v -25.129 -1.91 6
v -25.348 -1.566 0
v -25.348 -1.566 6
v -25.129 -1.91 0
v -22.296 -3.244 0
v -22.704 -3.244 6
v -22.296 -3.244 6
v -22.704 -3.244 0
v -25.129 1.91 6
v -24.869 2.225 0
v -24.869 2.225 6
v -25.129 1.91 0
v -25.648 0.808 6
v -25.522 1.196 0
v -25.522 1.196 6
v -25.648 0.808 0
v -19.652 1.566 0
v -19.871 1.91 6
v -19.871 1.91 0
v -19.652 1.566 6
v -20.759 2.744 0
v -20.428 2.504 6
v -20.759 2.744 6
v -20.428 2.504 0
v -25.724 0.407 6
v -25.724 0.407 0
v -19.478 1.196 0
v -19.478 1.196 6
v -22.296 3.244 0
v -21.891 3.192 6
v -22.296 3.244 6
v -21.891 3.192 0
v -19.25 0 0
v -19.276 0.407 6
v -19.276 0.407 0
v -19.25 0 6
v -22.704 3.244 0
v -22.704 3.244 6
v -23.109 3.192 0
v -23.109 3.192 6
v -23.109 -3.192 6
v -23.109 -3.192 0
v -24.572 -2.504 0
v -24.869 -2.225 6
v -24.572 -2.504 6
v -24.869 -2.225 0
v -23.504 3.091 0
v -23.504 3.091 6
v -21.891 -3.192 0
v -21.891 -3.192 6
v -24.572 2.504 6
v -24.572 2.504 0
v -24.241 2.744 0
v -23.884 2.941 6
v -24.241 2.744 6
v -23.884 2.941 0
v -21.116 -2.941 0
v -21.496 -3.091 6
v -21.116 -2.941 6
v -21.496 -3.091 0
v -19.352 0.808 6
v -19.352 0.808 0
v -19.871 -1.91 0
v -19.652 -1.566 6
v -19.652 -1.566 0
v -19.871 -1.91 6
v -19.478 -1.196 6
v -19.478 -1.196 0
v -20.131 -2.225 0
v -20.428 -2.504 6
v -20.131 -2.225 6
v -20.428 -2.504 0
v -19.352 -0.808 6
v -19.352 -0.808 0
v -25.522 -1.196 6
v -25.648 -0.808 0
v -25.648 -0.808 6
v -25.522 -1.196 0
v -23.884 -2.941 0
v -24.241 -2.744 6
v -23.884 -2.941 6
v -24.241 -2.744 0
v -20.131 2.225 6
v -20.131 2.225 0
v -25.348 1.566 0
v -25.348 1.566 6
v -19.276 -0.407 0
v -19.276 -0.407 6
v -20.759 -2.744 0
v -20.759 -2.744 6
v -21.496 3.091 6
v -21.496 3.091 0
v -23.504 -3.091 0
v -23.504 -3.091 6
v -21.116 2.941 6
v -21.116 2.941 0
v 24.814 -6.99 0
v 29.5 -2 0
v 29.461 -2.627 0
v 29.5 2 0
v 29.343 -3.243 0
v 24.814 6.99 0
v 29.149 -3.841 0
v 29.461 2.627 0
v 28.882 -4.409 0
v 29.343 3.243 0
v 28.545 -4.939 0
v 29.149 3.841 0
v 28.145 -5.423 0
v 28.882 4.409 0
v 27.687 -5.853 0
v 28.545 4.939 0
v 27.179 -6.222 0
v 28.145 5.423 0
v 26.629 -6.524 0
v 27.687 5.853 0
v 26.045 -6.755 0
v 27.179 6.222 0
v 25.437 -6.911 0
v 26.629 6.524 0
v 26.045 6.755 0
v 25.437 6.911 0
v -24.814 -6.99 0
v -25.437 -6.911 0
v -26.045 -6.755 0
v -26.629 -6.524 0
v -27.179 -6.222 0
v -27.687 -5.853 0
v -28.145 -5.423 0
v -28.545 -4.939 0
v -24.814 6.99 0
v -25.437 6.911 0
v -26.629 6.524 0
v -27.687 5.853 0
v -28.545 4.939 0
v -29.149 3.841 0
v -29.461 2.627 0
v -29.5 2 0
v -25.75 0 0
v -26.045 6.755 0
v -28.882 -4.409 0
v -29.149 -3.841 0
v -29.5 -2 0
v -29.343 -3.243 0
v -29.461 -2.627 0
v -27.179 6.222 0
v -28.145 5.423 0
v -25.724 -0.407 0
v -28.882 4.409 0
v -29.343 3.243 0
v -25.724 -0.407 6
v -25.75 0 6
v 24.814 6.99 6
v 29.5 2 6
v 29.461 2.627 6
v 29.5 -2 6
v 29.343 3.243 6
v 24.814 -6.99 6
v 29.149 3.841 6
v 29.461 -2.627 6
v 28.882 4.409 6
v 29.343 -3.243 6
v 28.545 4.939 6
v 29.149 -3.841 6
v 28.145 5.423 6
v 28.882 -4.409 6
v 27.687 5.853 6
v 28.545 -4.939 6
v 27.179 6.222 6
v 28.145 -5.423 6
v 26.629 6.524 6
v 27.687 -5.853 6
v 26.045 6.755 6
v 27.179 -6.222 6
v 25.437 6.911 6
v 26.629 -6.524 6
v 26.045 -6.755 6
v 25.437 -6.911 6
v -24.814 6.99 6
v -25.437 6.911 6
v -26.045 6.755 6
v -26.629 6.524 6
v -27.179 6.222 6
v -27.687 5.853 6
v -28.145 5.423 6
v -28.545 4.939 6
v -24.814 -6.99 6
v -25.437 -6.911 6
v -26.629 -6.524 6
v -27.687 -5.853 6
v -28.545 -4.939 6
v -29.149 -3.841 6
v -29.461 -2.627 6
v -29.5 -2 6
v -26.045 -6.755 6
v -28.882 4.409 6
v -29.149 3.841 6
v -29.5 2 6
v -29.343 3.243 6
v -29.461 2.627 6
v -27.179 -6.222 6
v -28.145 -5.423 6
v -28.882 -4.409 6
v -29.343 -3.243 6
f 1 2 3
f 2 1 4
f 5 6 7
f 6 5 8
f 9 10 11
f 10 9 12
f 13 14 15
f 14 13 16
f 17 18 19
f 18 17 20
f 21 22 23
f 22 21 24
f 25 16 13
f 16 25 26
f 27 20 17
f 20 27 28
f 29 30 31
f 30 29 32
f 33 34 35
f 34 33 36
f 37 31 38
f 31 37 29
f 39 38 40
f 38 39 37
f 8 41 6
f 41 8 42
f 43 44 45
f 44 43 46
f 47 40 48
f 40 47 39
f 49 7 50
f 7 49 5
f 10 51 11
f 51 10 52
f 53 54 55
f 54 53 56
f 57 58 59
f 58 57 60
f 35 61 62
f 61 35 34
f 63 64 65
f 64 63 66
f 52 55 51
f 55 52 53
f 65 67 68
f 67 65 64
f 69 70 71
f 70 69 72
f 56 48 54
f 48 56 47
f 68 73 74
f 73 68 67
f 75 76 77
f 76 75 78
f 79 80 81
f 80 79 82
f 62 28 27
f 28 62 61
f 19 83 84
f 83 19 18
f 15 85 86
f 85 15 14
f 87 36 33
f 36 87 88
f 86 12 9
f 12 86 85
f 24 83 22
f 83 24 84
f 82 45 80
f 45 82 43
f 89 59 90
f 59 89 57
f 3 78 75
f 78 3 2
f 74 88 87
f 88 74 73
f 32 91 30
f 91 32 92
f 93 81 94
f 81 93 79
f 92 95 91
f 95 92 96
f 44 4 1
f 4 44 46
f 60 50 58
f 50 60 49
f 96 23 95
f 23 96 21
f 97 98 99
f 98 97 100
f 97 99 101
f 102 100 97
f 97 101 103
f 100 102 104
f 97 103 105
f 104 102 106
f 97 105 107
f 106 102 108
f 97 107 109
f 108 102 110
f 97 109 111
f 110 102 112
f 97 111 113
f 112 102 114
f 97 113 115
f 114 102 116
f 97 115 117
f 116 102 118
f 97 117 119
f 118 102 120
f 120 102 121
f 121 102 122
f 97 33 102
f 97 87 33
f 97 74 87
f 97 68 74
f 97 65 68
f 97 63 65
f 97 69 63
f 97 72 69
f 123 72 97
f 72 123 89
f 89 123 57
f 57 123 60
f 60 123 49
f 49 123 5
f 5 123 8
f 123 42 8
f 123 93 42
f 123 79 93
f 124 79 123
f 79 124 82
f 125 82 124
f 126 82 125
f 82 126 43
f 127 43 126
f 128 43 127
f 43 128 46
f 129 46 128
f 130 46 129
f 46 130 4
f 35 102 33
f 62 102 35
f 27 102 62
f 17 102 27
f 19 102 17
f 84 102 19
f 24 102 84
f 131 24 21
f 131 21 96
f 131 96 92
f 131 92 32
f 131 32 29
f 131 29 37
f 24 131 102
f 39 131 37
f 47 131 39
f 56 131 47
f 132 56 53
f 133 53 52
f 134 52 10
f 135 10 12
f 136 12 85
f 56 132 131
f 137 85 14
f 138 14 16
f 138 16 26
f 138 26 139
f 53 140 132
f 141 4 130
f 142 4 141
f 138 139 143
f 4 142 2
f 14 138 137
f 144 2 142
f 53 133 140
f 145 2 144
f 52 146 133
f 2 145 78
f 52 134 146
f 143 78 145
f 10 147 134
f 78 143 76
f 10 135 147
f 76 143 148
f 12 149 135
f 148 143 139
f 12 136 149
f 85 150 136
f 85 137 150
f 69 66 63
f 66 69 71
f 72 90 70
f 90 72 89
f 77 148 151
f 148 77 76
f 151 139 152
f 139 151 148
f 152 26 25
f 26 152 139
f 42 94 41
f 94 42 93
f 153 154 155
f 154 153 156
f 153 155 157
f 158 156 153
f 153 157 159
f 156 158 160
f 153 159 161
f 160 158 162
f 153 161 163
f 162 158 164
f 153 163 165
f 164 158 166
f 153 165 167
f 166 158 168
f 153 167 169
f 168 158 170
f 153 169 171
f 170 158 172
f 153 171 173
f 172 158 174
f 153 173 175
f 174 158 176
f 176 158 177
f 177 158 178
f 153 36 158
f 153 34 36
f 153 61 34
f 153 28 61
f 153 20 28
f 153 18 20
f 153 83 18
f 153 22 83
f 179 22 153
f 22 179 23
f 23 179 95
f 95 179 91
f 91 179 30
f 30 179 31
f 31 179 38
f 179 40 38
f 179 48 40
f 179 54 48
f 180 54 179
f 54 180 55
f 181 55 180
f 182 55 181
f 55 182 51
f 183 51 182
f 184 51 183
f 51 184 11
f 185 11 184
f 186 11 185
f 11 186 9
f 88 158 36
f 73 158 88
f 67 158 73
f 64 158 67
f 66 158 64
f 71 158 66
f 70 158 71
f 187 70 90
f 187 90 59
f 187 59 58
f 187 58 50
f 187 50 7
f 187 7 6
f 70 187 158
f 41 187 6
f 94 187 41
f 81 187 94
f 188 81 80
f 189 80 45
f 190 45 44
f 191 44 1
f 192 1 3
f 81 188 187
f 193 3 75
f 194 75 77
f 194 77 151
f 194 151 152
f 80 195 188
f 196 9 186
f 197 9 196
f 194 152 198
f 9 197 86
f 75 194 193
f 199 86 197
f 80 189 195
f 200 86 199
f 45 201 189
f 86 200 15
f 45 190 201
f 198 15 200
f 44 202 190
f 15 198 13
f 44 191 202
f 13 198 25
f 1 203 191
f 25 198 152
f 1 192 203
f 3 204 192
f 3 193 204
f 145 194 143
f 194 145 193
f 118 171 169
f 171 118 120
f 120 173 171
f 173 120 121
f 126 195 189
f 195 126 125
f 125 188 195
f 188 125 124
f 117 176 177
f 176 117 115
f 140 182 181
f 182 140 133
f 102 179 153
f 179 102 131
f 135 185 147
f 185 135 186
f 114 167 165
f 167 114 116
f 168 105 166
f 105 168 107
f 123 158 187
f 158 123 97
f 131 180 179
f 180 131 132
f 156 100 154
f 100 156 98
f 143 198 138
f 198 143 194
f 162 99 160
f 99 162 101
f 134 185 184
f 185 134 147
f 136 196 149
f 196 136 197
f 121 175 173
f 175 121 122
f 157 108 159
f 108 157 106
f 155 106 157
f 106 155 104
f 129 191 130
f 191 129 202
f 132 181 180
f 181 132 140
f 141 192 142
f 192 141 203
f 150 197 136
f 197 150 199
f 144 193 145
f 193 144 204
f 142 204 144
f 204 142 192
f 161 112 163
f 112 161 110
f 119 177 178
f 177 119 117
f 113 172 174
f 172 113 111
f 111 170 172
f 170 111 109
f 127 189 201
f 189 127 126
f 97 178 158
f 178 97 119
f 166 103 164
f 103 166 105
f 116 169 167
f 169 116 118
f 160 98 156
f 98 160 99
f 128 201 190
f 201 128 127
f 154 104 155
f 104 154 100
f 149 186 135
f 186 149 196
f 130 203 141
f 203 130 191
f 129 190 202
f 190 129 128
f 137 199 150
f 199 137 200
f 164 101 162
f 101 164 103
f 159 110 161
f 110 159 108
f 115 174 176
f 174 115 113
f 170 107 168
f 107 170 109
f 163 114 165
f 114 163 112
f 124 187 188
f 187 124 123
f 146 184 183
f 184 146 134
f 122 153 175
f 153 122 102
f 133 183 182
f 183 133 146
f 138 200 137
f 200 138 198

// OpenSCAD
$fn = 50;


difference() {
	union() {
		hull() {
			translate(v = [-24.5000000000, 2.0000000000, 0]) {
				cylinder(h = 6, r = 5);
			}
			translate(v = [24.5000000000, 2.0000000000, 0]) {
				cylinder(h = 6, r = 5);
			}
			translate(v = [-24.5000000000, -2.0000000000, 0]) {
				cylinder(h = 6, r = 5);
			}
			translate(v = [24.5000000000, -2.0000000000, 0]) {
				cylinder(h = 6, r = 5);
			}
		}
	}
	union() {
		translate(v = [-22.5000000000, 0.0000000000, 0]) {
			cylinder(h = 6, r = 3.2500000000);
		}
		translate(v = [-22.5000000000, 0.0000000000, 0]) {
			cylinder(h = 6, r = 1.8000000000);
		}
		translate(v = [-22.5000000000, 0.0000000000, 0]) {
			cylinder(h = 6, r = 1.8000000000);
		}
		translate(v = [-22.5000000000, 0.0000000000, 0]) {
			cylinder(h = 6, r = 1.8000000000);
		}
	}
}
